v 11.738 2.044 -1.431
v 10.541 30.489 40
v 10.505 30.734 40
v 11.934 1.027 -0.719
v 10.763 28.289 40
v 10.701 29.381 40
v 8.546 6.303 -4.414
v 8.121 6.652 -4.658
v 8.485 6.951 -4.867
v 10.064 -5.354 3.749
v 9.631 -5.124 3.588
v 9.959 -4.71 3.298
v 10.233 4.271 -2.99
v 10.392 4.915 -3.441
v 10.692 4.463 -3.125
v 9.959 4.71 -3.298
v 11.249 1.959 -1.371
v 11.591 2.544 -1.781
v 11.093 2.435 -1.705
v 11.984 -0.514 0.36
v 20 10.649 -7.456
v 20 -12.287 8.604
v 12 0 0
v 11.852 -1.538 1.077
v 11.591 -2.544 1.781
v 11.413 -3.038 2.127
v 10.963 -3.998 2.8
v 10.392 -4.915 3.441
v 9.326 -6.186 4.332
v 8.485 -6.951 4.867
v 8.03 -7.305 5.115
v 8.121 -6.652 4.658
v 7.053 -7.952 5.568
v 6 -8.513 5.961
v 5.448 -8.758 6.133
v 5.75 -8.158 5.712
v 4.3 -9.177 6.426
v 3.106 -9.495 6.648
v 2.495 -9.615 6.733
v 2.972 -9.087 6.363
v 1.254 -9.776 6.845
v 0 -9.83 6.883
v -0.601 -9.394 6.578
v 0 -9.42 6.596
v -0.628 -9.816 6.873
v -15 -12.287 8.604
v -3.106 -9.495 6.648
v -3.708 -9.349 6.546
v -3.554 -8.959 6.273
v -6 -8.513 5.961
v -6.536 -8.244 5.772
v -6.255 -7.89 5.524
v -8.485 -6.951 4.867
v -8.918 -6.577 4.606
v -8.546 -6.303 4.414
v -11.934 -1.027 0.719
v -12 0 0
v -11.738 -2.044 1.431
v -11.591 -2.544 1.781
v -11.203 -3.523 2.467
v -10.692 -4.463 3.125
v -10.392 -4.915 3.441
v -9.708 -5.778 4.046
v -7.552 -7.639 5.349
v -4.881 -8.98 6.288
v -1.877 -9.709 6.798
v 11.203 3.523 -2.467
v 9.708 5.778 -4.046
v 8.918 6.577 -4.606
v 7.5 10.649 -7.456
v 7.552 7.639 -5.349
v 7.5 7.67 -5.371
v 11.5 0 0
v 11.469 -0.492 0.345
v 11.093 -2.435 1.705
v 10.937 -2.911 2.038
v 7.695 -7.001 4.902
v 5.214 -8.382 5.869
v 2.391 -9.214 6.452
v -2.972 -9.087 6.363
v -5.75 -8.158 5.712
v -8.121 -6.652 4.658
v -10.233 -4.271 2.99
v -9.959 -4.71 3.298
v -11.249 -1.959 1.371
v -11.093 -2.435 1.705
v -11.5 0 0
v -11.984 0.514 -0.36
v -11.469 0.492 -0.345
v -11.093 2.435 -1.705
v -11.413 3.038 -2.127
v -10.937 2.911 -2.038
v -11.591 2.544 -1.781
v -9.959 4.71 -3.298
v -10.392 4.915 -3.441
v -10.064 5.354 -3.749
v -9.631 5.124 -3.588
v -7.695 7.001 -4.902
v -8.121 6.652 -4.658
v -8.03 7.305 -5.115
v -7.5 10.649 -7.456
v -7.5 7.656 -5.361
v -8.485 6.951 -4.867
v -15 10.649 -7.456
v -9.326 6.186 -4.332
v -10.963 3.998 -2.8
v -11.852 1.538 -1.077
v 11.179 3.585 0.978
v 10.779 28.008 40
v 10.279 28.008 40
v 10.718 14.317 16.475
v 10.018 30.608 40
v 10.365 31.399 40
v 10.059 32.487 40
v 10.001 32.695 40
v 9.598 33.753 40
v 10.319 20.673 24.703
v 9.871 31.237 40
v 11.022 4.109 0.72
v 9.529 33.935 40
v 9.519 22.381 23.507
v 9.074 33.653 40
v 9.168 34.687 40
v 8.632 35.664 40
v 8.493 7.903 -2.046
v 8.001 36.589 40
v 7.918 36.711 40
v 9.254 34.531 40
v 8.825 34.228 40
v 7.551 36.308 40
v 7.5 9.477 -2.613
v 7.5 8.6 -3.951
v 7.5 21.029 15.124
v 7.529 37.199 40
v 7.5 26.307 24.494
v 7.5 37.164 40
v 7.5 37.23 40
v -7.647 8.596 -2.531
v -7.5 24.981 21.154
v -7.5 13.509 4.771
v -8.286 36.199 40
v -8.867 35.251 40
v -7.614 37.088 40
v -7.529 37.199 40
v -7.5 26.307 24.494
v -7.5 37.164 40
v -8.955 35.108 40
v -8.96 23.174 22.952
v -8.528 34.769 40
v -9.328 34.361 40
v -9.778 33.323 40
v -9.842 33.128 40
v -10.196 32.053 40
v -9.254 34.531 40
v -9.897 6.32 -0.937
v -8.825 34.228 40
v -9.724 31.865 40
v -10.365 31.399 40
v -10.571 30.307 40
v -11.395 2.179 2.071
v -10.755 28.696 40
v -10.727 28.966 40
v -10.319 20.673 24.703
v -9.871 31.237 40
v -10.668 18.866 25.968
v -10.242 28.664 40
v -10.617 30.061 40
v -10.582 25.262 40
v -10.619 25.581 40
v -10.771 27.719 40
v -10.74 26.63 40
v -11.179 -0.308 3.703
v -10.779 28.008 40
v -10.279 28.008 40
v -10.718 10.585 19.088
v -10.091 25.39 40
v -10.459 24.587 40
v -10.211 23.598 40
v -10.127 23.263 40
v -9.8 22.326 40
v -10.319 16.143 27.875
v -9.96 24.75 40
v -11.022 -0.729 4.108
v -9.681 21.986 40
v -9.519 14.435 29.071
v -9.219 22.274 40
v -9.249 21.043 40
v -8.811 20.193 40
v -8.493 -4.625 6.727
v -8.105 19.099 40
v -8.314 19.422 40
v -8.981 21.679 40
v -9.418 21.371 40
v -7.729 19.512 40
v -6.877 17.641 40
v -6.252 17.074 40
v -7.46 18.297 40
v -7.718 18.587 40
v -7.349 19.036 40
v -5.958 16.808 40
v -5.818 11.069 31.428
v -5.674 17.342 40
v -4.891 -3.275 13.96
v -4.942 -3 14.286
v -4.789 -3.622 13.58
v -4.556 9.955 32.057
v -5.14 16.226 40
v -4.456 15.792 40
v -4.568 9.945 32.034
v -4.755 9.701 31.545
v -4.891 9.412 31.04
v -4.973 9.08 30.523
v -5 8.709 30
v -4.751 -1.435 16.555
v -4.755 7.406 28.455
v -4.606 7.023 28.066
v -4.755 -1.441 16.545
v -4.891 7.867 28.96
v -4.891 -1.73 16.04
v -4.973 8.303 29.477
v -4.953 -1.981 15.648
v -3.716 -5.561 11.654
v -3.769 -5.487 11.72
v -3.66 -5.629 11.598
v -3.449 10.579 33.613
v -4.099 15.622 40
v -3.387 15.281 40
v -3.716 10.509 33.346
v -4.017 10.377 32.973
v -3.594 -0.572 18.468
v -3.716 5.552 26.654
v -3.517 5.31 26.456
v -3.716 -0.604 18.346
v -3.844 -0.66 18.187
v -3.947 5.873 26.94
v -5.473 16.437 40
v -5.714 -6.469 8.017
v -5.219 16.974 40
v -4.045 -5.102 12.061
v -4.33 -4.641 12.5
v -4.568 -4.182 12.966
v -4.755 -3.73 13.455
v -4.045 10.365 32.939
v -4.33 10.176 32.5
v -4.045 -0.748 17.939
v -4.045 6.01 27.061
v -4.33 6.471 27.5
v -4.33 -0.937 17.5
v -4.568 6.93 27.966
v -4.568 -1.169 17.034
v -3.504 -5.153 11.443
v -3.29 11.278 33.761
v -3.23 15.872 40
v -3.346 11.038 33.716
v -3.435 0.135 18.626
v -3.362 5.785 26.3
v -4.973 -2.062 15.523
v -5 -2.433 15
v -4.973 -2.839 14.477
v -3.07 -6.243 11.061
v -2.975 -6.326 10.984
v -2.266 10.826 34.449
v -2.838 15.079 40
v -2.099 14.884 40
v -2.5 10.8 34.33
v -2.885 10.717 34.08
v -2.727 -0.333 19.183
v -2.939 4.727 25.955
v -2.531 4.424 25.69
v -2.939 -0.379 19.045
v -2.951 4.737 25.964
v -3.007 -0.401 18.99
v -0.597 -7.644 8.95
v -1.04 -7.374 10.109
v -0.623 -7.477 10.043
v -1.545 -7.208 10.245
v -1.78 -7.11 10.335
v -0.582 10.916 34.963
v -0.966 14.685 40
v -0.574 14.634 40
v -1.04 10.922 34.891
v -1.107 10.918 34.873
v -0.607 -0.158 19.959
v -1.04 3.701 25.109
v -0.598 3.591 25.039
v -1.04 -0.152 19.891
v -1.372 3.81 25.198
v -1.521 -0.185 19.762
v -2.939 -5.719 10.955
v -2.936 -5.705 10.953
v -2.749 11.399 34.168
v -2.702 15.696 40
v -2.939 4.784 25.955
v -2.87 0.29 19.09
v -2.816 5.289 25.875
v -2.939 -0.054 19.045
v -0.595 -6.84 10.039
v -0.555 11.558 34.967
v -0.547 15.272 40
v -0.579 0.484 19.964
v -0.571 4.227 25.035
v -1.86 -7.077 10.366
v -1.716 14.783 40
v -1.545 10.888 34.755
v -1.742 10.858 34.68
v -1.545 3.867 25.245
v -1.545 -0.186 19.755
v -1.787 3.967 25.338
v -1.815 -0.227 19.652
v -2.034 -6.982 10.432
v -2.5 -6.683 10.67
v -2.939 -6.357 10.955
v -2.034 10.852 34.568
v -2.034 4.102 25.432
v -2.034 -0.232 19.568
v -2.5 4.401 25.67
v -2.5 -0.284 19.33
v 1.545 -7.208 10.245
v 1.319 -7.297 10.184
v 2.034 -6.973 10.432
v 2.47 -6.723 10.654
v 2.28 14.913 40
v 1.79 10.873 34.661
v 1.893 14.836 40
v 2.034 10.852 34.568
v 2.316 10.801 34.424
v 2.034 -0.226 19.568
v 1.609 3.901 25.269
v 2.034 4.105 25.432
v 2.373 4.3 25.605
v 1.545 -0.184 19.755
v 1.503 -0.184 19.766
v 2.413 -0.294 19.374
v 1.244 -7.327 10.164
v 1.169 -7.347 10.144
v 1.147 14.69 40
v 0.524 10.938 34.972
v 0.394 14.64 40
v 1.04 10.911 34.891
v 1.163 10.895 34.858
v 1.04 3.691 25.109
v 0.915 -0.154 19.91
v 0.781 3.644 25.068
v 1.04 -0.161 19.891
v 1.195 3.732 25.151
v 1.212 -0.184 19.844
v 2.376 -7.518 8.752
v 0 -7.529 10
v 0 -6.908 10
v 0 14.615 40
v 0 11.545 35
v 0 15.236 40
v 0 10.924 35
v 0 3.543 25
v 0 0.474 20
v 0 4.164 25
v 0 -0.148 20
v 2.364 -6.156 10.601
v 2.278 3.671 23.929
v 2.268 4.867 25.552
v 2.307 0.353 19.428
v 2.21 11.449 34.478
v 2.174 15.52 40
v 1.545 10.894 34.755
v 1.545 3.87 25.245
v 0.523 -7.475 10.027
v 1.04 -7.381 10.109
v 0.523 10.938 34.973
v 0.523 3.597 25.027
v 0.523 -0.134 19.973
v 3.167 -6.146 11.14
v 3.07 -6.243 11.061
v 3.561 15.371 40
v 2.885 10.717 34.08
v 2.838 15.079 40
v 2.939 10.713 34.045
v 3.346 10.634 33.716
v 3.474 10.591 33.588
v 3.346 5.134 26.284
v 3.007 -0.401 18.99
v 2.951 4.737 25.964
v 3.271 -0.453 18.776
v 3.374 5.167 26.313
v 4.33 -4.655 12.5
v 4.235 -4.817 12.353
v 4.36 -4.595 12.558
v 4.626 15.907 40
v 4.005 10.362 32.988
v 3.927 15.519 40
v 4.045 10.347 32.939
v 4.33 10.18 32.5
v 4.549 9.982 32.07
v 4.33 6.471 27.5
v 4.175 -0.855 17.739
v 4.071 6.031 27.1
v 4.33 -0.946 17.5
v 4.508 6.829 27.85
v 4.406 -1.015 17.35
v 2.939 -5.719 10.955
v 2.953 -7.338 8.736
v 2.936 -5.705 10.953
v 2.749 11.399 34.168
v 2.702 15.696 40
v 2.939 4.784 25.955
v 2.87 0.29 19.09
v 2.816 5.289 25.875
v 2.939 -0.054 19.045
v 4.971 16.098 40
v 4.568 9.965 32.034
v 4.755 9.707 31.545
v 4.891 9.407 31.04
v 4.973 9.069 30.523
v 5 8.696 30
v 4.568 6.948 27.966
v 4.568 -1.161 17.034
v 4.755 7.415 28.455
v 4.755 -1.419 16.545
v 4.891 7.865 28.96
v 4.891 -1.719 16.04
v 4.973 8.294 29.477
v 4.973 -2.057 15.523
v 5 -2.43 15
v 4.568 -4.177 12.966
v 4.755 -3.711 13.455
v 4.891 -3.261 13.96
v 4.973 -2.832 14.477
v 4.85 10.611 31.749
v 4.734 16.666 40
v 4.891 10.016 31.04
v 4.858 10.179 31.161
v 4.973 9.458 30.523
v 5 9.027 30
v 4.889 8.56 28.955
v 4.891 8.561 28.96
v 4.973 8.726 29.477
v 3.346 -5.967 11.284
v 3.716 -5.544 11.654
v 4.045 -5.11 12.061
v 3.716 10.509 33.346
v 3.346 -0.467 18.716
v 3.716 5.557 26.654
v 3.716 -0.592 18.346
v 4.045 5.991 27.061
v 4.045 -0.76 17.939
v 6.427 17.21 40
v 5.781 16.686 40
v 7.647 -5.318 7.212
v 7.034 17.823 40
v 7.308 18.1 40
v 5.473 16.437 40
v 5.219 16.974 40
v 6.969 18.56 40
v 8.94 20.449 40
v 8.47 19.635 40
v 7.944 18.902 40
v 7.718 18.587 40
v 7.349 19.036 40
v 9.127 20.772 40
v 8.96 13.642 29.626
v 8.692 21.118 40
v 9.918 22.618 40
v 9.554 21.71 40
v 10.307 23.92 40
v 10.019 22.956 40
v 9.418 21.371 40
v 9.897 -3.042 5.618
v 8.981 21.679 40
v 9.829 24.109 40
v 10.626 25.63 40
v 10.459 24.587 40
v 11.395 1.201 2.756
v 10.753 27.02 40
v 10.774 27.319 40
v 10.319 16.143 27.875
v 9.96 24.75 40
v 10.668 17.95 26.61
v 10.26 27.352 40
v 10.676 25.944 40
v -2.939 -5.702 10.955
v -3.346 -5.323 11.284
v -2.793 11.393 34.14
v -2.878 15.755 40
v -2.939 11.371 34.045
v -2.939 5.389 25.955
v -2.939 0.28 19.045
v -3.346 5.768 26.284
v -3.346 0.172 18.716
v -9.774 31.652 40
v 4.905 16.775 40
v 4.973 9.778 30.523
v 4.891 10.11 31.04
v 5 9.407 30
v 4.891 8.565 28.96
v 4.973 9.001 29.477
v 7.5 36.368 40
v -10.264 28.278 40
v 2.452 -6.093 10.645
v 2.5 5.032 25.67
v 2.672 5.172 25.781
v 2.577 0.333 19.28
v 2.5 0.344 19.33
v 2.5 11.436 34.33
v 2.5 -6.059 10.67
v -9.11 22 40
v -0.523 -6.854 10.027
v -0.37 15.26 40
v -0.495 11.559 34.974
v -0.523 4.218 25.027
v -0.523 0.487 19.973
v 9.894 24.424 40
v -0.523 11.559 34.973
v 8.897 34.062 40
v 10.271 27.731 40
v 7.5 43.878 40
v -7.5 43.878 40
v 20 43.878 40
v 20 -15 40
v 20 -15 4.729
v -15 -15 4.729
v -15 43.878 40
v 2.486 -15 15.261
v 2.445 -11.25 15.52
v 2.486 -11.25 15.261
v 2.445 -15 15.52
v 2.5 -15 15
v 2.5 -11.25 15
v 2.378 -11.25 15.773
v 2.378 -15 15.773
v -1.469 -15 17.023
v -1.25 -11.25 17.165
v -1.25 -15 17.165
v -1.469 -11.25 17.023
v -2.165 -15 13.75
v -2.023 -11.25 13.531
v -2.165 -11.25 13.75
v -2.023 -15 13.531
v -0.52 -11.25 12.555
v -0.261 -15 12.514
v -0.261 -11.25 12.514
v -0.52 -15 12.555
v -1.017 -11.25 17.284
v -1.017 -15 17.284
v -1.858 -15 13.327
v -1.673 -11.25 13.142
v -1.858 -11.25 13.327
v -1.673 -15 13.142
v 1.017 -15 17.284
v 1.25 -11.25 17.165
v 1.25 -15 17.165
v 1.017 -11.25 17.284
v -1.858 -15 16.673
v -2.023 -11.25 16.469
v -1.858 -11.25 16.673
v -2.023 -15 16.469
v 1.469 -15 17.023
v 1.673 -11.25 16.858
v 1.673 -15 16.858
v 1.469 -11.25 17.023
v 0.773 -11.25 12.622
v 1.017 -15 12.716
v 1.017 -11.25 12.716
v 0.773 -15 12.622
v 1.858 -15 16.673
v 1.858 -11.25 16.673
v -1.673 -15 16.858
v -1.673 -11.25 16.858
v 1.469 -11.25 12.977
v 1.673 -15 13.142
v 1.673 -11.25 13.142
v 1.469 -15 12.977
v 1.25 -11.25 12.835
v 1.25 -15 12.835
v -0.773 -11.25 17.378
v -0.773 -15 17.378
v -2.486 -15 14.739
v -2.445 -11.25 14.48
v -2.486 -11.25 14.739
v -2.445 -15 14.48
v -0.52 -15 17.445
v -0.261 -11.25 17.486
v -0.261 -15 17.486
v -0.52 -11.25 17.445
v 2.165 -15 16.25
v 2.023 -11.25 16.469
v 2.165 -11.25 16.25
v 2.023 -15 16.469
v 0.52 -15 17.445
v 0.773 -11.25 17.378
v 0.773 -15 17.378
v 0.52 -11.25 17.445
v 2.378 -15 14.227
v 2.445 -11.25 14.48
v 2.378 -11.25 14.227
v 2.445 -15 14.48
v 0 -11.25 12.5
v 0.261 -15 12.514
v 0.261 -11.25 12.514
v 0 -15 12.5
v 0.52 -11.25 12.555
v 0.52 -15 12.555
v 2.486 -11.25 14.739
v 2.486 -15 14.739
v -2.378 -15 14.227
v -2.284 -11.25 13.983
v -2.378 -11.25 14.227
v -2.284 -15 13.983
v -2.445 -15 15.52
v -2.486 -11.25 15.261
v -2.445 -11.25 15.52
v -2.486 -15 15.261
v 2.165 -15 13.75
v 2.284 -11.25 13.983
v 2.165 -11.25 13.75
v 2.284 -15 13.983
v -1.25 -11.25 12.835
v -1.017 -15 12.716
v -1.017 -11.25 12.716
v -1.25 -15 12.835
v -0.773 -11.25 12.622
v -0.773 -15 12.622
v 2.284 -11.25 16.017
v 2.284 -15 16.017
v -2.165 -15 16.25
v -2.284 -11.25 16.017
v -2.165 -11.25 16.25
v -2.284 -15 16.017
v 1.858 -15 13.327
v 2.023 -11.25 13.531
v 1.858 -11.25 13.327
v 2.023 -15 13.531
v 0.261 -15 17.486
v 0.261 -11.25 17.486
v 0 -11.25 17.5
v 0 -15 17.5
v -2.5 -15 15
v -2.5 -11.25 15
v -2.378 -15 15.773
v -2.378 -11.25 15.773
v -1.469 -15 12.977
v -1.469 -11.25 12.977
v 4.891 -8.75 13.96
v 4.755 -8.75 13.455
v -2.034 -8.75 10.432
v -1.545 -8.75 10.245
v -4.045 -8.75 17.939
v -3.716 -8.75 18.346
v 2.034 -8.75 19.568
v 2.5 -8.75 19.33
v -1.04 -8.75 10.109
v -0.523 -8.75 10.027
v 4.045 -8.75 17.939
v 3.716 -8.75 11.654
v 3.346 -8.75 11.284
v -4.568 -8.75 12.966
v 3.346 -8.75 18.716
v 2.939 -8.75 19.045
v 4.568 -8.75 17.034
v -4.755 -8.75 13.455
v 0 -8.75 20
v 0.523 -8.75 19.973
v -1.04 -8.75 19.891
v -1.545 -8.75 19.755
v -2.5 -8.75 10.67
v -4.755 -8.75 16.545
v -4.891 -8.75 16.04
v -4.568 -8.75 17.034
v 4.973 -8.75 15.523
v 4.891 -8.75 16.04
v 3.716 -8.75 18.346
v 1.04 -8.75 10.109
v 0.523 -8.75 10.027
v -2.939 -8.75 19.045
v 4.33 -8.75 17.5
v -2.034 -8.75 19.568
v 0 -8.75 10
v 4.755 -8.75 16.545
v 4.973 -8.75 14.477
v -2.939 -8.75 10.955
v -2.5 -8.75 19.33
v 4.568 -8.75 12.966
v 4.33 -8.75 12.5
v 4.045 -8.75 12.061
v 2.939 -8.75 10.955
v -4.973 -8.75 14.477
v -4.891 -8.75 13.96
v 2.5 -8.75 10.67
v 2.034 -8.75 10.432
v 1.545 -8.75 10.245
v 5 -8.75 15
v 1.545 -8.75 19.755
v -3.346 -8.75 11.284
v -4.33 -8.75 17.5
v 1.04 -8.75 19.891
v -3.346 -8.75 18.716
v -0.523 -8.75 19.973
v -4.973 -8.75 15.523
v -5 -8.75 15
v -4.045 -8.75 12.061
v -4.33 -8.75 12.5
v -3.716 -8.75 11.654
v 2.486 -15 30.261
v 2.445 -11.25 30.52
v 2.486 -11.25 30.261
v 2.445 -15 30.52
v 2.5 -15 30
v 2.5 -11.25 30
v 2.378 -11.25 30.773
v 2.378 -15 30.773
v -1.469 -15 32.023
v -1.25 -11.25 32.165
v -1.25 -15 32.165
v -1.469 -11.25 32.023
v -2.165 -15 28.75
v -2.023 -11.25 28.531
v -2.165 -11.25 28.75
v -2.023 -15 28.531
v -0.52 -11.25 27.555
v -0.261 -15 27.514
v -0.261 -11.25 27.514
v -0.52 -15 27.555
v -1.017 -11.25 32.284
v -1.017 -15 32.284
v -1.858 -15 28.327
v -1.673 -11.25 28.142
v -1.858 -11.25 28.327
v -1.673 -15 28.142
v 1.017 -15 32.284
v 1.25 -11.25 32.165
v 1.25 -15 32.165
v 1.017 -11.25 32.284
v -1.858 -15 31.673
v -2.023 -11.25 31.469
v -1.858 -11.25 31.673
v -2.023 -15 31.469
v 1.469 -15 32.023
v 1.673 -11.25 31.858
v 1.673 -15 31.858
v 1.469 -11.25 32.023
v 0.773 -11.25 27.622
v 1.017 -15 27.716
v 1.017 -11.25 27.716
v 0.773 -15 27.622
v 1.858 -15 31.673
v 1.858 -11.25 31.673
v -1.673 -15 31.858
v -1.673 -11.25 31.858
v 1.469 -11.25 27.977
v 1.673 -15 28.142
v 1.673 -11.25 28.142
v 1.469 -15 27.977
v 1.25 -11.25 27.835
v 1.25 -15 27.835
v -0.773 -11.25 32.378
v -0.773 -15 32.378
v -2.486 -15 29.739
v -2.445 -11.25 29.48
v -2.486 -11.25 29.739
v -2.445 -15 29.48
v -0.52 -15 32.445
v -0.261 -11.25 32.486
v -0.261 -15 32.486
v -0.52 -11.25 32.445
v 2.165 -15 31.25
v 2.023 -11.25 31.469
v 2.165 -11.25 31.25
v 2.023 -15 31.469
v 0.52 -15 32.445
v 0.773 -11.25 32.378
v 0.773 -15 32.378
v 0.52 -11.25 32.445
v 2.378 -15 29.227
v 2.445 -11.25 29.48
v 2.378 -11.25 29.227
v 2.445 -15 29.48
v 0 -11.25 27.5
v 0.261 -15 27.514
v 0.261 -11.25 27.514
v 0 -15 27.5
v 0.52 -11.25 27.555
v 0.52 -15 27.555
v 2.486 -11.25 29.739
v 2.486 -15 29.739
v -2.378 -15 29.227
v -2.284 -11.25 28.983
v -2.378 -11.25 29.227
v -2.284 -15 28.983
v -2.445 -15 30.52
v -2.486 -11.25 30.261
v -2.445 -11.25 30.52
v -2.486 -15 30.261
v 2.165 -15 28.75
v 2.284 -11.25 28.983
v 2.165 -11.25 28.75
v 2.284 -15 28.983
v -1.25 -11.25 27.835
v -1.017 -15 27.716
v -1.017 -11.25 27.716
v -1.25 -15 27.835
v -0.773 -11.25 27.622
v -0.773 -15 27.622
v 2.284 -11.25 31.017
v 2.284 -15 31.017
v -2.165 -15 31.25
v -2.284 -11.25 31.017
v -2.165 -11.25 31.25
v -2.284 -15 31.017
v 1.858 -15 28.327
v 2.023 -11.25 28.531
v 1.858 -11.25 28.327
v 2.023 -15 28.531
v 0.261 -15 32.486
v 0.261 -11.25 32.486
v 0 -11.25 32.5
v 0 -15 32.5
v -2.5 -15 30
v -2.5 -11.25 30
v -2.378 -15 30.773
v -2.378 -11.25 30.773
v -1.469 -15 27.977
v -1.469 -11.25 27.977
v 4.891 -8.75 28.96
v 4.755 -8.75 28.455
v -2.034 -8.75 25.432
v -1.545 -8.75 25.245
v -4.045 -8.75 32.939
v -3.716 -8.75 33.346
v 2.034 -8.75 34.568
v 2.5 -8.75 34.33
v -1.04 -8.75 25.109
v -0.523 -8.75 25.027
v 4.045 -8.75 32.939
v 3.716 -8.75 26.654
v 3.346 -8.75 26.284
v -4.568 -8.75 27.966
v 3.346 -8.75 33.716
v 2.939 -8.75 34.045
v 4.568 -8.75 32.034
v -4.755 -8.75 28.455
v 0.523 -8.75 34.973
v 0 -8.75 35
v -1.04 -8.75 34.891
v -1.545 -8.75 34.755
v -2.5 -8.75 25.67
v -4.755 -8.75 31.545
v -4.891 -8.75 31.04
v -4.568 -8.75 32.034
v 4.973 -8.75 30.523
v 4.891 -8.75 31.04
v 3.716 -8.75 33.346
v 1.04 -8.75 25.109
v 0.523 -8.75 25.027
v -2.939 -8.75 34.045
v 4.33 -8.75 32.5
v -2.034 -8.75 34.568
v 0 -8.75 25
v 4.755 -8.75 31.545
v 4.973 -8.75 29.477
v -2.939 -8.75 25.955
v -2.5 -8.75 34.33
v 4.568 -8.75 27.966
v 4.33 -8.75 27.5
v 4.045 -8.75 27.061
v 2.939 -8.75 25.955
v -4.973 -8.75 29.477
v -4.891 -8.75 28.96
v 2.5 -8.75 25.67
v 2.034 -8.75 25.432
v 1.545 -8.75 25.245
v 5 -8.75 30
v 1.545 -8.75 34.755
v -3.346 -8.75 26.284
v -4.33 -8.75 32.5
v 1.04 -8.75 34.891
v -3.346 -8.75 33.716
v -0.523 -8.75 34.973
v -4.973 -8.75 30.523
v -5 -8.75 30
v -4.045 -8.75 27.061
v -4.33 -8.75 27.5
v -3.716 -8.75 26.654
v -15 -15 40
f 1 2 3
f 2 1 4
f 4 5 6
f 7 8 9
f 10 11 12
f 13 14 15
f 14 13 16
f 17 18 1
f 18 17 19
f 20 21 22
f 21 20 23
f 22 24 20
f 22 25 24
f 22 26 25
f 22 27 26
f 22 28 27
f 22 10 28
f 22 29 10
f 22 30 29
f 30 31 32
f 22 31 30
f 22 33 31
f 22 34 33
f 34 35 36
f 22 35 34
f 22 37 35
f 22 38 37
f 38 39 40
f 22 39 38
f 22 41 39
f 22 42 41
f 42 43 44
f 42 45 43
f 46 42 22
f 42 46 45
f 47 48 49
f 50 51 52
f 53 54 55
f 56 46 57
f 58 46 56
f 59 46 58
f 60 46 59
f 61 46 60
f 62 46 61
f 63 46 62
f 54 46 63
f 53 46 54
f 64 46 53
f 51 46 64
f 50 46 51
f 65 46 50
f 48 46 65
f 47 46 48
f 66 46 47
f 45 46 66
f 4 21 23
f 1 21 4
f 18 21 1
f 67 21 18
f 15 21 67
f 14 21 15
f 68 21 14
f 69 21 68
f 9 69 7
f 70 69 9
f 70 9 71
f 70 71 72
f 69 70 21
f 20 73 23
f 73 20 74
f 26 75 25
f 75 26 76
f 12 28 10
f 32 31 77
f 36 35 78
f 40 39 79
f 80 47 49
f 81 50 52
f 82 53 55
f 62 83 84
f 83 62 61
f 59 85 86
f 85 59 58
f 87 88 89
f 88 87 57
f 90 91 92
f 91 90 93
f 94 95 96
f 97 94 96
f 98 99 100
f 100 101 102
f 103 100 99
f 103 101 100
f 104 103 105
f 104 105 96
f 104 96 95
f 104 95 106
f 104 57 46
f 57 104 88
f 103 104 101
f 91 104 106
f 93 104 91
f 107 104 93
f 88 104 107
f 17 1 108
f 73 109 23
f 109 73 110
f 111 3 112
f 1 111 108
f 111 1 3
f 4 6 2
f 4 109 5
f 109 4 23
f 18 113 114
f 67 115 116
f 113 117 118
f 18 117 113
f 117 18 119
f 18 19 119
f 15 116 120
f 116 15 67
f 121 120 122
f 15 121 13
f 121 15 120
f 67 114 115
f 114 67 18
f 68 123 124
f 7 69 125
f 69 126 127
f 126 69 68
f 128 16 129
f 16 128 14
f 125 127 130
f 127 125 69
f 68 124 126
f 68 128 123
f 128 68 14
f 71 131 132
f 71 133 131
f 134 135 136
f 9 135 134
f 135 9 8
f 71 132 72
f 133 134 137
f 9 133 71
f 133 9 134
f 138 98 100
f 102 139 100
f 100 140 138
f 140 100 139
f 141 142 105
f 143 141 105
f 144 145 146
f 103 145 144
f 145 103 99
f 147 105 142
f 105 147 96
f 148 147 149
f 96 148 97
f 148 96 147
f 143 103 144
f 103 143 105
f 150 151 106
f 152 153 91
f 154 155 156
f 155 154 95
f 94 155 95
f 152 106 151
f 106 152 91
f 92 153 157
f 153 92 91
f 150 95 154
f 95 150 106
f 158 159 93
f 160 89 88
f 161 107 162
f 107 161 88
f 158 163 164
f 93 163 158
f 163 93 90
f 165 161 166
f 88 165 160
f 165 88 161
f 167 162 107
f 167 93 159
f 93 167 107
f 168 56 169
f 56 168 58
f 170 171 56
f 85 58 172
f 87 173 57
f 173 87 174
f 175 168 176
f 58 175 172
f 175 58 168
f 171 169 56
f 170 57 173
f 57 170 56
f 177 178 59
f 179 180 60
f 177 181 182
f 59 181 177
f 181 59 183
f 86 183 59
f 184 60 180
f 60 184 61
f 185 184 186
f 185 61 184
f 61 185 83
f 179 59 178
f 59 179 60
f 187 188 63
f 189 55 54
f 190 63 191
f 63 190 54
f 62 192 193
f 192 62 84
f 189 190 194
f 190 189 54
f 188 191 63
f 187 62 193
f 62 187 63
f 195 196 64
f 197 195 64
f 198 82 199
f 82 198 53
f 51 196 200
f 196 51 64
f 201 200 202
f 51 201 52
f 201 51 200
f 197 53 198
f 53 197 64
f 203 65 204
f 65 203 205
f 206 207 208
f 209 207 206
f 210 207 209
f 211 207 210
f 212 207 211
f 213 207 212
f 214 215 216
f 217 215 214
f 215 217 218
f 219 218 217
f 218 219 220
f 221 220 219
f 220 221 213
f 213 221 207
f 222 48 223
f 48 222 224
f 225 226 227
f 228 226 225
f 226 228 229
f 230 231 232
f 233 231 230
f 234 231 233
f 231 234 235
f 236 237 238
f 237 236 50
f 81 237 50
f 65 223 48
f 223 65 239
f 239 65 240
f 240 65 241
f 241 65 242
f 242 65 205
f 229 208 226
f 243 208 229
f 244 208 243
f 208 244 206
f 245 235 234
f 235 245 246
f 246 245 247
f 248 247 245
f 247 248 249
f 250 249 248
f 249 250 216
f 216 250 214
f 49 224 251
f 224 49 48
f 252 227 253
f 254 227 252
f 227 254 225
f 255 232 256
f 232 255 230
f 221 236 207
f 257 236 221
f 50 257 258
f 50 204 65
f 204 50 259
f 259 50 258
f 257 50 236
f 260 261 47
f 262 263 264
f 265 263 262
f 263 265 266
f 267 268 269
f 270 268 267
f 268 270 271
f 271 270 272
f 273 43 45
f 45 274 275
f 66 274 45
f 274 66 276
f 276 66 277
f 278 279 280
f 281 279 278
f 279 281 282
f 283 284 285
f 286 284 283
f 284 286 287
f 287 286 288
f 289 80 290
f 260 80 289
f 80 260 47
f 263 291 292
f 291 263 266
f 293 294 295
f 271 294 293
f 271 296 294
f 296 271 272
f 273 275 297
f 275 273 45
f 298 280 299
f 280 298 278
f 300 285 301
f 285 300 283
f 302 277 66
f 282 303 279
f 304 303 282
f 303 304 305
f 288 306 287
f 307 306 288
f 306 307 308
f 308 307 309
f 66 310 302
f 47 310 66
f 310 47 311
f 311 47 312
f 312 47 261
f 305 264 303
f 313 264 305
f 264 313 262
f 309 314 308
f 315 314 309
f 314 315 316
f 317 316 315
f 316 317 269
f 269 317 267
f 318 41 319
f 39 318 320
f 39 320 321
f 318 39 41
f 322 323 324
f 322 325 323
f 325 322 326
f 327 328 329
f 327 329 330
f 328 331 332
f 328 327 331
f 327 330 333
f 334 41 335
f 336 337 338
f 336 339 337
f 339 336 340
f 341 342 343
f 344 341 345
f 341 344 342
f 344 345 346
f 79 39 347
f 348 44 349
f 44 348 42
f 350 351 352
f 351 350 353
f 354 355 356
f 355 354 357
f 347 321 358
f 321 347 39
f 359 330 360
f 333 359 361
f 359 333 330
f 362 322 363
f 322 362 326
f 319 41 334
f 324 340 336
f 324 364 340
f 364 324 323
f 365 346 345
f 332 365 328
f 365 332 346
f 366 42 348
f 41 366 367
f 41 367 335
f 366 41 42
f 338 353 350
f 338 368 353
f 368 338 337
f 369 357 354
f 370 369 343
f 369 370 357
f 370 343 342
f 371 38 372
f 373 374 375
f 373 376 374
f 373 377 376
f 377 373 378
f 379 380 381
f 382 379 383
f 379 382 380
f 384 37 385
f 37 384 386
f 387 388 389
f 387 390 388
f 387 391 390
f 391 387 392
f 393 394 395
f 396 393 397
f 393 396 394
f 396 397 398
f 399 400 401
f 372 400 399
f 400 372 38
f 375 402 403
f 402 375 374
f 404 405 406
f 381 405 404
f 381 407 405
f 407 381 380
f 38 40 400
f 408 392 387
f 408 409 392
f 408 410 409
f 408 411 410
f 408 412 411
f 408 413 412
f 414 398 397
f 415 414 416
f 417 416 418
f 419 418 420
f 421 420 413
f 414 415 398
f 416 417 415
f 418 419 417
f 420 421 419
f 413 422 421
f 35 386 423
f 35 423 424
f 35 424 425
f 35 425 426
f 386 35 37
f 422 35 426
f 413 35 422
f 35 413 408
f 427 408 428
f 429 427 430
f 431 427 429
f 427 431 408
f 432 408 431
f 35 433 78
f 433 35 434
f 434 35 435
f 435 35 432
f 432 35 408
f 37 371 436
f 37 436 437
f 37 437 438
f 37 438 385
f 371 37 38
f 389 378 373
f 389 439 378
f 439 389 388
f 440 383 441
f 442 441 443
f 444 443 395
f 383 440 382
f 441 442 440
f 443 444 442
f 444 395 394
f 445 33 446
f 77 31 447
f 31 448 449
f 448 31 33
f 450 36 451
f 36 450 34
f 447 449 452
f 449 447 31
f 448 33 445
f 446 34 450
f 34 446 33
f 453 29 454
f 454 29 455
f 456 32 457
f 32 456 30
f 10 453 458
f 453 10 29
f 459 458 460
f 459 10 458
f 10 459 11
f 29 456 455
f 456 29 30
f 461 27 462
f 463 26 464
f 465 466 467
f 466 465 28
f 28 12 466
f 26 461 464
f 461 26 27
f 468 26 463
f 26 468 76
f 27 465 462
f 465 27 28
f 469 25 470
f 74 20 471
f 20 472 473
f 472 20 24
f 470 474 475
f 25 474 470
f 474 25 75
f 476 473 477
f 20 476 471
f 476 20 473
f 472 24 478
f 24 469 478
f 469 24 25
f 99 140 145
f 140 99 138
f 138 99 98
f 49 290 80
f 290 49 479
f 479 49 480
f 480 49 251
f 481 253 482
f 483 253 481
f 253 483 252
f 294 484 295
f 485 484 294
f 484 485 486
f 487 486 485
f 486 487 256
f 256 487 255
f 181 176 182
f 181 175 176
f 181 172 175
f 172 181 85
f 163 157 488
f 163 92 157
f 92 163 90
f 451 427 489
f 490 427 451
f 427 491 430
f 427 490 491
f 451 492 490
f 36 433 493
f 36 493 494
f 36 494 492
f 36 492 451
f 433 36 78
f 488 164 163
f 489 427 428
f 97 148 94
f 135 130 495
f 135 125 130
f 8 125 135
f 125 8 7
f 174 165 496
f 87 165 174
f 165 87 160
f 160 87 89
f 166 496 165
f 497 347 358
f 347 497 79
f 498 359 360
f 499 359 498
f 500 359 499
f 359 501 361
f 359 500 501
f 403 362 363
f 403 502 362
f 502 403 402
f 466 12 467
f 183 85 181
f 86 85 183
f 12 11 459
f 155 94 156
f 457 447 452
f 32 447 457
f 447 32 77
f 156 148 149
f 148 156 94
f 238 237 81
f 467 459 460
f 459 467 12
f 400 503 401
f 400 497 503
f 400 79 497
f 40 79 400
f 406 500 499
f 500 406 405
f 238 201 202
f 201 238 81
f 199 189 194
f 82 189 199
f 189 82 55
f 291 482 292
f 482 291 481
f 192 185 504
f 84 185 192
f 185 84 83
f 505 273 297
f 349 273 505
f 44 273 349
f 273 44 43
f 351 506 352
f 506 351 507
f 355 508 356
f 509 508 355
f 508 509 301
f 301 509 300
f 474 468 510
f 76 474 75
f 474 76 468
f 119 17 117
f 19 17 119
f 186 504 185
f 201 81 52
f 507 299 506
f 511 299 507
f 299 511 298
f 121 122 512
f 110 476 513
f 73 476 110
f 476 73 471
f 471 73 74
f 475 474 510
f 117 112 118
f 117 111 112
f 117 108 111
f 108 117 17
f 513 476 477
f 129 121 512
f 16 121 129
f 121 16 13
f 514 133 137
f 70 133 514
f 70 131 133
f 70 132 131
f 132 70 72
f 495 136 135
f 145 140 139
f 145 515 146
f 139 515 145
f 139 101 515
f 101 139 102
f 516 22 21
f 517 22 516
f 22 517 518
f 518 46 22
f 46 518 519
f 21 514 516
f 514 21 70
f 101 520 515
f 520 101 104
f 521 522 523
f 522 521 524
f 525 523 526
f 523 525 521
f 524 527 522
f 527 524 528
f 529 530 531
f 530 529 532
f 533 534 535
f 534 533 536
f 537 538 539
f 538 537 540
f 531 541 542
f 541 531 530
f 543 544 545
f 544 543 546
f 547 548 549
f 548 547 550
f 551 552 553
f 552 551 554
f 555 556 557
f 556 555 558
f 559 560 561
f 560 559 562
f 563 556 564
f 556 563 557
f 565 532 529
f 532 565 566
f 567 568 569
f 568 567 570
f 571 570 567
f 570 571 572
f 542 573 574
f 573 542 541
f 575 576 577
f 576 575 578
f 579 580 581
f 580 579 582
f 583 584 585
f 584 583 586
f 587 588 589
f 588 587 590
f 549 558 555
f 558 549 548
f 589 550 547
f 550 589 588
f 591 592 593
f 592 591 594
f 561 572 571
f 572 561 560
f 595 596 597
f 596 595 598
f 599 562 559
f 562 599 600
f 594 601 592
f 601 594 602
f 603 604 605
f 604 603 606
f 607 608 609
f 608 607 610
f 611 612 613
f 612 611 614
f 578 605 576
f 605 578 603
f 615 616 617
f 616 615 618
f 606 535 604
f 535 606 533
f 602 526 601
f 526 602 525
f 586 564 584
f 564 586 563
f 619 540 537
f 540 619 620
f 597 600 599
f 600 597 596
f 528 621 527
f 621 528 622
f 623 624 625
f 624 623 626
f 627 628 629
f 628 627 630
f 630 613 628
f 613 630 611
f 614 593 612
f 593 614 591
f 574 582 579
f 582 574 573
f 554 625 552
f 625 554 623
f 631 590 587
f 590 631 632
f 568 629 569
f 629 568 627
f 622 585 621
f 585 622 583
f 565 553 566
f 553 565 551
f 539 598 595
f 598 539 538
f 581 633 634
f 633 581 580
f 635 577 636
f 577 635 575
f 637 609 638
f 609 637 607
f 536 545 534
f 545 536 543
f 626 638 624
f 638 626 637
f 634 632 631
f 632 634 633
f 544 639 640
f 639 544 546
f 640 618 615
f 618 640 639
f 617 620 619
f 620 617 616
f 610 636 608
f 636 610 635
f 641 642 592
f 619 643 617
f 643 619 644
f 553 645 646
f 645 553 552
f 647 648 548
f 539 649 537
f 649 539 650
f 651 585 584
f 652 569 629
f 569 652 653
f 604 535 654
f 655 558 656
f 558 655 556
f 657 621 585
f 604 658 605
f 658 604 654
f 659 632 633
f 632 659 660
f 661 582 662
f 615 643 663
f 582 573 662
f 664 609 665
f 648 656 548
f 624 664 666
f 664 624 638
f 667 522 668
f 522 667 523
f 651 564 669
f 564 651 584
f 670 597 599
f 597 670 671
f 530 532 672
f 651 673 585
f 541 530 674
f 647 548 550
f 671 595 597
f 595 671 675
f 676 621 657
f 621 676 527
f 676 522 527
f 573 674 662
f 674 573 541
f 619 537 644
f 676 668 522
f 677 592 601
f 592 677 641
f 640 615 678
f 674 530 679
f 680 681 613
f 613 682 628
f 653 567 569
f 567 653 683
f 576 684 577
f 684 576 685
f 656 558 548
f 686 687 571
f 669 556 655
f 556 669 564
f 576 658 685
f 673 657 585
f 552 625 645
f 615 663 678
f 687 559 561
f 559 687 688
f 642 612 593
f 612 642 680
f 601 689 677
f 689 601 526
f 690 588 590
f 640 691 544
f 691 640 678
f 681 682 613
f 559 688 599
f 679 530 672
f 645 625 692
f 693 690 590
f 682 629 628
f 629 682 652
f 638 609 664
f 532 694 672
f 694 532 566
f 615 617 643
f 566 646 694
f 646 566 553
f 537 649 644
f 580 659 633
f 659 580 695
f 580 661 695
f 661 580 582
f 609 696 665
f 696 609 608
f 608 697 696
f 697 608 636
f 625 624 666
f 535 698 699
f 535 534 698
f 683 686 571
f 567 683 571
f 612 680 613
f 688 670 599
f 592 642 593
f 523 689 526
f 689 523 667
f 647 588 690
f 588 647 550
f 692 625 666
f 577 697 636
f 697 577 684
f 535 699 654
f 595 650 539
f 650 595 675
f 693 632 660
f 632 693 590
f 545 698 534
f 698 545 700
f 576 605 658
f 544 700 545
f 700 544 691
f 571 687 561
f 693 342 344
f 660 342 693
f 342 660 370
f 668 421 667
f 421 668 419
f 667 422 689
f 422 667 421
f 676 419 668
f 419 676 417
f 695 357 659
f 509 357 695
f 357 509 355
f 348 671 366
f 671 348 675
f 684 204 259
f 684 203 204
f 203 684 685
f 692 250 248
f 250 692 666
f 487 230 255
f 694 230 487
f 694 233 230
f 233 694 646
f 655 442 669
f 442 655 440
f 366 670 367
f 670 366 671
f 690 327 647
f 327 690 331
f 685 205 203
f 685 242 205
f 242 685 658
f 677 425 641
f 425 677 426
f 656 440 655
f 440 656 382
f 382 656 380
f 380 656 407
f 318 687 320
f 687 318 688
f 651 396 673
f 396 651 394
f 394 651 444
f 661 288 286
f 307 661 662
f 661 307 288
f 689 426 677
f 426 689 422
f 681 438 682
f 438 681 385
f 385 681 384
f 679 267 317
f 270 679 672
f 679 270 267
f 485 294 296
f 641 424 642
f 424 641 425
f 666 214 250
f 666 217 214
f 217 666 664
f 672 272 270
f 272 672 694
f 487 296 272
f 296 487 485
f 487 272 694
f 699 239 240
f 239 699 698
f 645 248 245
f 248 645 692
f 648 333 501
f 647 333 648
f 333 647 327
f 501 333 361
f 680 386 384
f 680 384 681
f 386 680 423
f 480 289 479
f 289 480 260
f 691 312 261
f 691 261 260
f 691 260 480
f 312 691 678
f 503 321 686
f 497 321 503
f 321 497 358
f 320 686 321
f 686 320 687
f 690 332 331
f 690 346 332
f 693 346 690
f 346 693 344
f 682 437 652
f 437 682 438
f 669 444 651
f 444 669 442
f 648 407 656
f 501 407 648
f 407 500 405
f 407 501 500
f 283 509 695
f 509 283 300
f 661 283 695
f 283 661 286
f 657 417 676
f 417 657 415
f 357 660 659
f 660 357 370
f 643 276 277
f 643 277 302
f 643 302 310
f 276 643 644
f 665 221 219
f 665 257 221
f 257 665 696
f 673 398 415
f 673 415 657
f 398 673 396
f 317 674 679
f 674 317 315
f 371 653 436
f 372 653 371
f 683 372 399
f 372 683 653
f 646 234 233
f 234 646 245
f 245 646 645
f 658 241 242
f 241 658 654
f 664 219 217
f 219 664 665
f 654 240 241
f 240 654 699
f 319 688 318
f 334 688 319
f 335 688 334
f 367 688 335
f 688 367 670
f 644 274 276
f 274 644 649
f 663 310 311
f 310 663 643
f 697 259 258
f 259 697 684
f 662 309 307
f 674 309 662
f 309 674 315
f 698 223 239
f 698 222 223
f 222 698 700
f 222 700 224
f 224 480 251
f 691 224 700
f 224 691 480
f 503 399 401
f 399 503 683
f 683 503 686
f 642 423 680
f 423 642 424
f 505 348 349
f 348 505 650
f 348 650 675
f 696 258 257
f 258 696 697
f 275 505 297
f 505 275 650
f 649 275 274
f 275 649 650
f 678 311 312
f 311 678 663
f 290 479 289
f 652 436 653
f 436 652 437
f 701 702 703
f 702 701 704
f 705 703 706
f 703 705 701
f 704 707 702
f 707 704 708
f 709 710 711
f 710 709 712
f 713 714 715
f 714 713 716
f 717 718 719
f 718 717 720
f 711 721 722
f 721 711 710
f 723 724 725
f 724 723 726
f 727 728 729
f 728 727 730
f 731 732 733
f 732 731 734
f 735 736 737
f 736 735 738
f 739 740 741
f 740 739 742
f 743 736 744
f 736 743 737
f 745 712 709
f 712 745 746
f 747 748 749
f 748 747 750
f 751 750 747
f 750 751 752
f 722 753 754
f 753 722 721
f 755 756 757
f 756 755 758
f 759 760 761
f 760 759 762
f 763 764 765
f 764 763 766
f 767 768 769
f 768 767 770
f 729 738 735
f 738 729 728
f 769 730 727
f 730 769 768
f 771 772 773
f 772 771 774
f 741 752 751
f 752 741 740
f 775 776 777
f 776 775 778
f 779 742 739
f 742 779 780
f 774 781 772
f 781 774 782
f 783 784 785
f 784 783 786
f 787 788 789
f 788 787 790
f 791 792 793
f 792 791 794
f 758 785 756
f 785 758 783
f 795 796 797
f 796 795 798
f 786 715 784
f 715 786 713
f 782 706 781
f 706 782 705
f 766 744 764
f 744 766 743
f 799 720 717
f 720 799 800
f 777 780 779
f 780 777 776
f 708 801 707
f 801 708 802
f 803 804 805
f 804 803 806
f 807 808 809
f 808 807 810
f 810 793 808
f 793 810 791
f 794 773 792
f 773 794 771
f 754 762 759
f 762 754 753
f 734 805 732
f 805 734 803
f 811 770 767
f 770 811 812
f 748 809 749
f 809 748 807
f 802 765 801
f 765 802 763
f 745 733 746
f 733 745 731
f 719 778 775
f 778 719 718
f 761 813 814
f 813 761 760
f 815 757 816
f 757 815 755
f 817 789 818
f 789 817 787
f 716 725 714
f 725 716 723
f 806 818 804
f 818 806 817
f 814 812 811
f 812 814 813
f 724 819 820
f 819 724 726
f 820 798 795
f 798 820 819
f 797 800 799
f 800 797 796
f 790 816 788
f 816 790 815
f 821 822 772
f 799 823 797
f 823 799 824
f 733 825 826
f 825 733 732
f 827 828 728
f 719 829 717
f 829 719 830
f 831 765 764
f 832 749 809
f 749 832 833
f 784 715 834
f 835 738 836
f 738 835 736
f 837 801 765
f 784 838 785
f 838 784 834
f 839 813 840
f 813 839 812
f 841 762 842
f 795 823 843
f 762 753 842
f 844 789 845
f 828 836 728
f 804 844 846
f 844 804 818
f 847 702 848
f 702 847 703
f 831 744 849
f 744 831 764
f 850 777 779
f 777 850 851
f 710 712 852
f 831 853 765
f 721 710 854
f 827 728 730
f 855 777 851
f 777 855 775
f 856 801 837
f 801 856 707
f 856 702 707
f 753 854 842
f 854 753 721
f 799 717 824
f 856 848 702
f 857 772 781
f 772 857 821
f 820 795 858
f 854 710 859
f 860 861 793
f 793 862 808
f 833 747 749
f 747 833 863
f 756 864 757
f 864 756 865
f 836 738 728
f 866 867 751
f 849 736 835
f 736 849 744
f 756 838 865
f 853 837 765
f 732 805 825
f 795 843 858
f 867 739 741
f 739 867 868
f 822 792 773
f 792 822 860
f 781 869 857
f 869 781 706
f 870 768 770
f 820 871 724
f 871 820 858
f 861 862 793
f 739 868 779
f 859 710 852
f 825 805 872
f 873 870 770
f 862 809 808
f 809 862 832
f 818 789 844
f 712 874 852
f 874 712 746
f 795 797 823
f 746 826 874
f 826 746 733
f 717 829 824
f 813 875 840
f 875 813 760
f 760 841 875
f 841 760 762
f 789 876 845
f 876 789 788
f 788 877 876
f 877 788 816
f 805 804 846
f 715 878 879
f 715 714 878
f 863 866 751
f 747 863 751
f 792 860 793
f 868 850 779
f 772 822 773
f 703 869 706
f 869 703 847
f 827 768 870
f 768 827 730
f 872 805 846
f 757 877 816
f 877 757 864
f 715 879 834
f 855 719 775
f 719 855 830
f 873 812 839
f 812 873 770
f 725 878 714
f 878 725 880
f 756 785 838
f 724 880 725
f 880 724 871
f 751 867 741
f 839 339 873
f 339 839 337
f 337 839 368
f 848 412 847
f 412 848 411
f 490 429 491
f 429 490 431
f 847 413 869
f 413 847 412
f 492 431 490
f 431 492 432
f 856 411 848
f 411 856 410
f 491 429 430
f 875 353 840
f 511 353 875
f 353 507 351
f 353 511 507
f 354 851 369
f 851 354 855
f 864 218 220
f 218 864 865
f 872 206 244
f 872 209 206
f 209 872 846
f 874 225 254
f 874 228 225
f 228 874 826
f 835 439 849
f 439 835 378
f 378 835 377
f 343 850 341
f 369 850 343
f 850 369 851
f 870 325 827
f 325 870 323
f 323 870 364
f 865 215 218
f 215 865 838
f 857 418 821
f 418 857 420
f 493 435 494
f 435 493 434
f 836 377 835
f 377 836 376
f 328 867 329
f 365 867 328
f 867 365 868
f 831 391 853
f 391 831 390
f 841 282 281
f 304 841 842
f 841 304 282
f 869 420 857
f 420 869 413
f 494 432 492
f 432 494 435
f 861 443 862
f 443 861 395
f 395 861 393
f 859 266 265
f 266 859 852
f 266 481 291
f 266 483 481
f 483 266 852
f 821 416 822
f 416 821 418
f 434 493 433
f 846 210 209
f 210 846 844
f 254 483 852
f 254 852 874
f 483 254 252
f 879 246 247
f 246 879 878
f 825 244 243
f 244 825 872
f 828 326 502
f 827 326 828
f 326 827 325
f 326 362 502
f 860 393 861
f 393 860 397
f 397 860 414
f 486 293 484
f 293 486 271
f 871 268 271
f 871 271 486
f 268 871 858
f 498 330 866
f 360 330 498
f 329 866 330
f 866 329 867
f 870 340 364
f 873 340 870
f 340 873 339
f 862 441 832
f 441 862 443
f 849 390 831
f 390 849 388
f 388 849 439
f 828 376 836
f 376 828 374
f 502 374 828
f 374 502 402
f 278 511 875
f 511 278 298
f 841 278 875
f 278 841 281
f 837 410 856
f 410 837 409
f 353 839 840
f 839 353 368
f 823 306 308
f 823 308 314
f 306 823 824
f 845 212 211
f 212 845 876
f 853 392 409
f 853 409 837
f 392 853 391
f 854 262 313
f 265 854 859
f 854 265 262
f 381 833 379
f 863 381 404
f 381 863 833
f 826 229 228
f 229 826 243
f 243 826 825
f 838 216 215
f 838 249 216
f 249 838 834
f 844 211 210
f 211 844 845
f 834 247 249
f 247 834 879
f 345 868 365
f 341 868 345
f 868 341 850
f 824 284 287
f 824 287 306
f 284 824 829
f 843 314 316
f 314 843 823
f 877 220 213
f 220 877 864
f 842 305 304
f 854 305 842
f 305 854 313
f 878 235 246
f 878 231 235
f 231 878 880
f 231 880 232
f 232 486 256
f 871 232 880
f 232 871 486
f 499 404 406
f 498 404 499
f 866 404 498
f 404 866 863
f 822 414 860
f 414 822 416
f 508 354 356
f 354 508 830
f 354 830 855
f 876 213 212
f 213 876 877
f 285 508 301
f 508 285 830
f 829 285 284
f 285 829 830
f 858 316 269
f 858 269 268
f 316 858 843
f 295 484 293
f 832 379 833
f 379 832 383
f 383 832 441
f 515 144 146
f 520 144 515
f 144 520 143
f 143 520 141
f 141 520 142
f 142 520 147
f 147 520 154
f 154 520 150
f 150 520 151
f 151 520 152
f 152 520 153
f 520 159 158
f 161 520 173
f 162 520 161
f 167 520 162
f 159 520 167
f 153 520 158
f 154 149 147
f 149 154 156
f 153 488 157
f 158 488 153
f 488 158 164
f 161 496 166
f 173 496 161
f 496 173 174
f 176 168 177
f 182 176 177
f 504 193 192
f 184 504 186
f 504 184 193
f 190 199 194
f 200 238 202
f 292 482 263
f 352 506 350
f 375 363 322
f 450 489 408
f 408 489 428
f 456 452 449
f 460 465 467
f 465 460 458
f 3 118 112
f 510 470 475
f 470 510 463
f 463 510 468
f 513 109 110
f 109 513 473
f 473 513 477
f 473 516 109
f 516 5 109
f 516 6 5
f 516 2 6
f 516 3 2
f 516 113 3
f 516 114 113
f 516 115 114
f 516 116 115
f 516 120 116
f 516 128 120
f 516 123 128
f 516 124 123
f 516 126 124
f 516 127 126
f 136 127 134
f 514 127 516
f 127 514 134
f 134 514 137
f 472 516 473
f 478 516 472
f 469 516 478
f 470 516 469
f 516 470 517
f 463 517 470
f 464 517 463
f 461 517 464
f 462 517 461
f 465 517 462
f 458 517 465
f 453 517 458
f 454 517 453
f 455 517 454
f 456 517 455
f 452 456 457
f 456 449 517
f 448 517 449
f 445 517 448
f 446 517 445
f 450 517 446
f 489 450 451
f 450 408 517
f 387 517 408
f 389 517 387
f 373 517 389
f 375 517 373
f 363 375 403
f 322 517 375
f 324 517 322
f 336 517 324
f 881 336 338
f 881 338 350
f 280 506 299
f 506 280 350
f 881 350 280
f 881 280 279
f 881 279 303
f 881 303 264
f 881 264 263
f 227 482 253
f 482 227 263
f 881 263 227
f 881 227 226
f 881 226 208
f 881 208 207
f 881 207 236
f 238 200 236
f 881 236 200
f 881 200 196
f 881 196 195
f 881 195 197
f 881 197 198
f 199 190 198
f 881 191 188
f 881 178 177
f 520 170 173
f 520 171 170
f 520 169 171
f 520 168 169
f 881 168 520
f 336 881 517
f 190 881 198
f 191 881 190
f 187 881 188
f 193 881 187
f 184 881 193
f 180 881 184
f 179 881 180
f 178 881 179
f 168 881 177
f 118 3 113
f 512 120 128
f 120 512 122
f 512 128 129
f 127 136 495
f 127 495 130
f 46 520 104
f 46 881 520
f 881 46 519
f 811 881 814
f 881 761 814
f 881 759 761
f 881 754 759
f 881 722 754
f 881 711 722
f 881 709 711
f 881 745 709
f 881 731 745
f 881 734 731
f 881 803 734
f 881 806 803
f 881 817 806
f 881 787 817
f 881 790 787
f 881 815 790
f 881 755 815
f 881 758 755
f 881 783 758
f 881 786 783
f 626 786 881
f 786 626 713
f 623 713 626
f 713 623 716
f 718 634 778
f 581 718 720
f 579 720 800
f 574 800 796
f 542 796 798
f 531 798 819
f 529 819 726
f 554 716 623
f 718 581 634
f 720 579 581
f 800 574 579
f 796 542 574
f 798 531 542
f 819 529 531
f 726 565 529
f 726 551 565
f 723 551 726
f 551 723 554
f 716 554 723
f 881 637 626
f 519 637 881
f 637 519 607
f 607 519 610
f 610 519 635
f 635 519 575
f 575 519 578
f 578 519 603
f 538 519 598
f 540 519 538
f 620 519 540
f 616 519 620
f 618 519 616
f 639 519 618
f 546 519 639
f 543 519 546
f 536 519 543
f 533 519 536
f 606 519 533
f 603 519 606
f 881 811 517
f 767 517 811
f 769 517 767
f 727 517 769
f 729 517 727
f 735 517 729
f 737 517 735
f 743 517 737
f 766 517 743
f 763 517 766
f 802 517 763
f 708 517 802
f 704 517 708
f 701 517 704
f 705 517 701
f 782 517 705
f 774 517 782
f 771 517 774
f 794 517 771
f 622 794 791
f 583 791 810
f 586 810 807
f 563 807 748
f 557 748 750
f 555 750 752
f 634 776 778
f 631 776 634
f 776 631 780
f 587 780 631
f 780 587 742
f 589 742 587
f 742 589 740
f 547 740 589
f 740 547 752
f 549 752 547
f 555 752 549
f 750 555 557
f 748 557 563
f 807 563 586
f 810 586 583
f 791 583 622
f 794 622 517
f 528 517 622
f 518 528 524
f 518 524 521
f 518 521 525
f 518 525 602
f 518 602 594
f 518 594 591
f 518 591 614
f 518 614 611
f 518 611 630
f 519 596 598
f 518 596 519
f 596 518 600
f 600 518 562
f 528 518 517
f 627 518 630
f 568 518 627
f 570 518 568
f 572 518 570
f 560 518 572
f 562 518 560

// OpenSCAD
// d1 21.5 d2 23 h 30
// angle 35°

r1 = 11.5;
r2 = 10.00;
h = 60;
o = 7.5;
tilt = -35;
// tilt = 0;

$fn = 60;

module holder () {
  rotate(tilt, [1, 0, 0]) {  
    rotate_extrude()
      polygon(points=[[0,0],[r1,0],[r2,h],[0,h]]);
    for ( i = [0: 23] ){
      rotate( i * 15, [0, 0, 1]) {
        rotate_extrude(angle=12) 
          polygon(points=[[0,0],[r1+0.5,0],[r2+0.5,h],[0,h]]); 
        } 
    }
    translate([-o, 0, 0]) cube([2 * o, r1 + 10, h]);
    translate([-20, -15, -40]) cube([40, 40, 40]);
    translate([-20, 13 , -10]) cube([40, 60, h + 40]);
  }
}

module screw () {
 rotate(90, [1, 0, 0]) {
   cylinder(r=2.5, h=40, center=true);
   translate([0, 0, -10]) cylinder(r1=5, r2=2.5, h=2.5, center=true);
   translate([0, 0, -22.5])cylinder(r=5, h=22.5, center=true);
 }
} 

difference () {
  translate ([-15, -15, -10]) cube([35, 75, 50]);
  holder();
  translate([0, -20, 15])screw();
  translate([0, -20, 30])screw();
}
